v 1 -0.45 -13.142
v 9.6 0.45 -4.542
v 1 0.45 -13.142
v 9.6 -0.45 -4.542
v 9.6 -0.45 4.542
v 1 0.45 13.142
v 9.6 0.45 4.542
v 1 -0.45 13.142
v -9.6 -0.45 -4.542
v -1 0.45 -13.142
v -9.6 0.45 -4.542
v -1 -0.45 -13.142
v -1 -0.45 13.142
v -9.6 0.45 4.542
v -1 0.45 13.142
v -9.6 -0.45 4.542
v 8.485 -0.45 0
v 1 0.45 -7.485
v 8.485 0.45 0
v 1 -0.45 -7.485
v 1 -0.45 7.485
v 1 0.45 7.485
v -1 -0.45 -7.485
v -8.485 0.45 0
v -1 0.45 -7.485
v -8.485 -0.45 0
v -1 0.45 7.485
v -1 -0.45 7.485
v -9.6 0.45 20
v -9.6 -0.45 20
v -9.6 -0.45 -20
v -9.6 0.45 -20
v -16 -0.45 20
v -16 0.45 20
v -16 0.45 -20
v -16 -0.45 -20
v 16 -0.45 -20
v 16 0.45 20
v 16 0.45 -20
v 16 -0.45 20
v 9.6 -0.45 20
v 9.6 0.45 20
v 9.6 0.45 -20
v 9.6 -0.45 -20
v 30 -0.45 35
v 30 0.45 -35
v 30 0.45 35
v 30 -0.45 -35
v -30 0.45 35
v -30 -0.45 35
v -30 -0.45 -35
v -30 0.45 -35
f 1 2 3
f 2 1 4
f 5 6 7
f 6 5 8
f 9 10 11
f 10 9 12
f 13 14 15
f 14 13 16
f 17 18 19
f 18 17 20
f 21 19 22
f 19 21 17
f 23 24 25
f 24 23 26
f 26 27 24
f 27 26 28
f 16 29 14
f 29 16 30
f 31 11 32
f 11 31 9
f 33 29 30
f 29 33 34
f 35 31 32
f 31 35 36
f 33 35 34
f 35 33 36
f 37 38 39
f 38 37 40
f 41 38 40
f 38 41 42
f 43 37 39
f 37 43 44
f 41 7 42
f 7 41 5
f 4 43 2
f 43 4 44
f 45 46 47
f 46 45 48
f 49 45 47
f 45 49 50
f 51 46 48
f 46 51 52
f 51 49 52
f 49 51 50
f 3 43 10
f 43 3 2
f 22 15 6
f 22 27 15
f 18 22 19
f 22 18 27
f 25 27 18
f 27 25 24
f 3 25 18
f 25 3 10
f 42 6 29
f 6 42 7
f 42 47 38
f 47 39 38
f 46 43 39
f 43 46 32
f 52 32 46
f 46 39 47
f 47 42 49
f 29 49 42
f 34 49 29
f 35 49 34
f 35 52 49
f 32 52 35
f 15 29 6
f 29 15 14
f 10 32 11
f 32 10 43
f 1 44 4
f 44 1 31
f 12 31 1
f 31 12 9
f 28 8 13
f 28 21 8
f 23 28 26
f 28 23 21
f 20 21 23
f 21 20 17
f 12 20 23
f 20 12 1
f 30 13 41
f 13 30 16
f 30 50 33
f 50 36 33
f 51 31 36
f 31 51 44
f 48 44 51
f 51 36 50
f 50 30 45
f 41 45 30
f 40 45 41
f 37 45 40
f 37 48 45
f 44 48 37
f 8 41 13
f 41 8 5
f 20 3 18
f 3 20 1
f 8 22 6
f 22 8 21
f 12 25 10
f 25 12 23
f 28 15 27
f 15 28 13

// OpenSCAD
totalScale = 0.8; // 1 == 50mm height

h_width = 8;
h_move_sideways = 16;
thicknessLogo = 1.3;
thicknessStencil = 0.9;

difference(){
cube([60,thicknessStencil,70], center = true);

scale([totalScale,1,totalScale]){
translate([-h_move_sideways,0,0])
cube([h_width,thicknessLogo,50], center = true);

rotate([0,45,0])
difference(){
cube([25,thicknessLogo,25], center = true);
cube([15,3*thicknessLogo,15], center = true);
}

translate([h_move_sideways,0,0])
cube([h_width,thicknessLogo,50], center = true);

}


}
cube([2,thicknessStencil,70], center = true);
